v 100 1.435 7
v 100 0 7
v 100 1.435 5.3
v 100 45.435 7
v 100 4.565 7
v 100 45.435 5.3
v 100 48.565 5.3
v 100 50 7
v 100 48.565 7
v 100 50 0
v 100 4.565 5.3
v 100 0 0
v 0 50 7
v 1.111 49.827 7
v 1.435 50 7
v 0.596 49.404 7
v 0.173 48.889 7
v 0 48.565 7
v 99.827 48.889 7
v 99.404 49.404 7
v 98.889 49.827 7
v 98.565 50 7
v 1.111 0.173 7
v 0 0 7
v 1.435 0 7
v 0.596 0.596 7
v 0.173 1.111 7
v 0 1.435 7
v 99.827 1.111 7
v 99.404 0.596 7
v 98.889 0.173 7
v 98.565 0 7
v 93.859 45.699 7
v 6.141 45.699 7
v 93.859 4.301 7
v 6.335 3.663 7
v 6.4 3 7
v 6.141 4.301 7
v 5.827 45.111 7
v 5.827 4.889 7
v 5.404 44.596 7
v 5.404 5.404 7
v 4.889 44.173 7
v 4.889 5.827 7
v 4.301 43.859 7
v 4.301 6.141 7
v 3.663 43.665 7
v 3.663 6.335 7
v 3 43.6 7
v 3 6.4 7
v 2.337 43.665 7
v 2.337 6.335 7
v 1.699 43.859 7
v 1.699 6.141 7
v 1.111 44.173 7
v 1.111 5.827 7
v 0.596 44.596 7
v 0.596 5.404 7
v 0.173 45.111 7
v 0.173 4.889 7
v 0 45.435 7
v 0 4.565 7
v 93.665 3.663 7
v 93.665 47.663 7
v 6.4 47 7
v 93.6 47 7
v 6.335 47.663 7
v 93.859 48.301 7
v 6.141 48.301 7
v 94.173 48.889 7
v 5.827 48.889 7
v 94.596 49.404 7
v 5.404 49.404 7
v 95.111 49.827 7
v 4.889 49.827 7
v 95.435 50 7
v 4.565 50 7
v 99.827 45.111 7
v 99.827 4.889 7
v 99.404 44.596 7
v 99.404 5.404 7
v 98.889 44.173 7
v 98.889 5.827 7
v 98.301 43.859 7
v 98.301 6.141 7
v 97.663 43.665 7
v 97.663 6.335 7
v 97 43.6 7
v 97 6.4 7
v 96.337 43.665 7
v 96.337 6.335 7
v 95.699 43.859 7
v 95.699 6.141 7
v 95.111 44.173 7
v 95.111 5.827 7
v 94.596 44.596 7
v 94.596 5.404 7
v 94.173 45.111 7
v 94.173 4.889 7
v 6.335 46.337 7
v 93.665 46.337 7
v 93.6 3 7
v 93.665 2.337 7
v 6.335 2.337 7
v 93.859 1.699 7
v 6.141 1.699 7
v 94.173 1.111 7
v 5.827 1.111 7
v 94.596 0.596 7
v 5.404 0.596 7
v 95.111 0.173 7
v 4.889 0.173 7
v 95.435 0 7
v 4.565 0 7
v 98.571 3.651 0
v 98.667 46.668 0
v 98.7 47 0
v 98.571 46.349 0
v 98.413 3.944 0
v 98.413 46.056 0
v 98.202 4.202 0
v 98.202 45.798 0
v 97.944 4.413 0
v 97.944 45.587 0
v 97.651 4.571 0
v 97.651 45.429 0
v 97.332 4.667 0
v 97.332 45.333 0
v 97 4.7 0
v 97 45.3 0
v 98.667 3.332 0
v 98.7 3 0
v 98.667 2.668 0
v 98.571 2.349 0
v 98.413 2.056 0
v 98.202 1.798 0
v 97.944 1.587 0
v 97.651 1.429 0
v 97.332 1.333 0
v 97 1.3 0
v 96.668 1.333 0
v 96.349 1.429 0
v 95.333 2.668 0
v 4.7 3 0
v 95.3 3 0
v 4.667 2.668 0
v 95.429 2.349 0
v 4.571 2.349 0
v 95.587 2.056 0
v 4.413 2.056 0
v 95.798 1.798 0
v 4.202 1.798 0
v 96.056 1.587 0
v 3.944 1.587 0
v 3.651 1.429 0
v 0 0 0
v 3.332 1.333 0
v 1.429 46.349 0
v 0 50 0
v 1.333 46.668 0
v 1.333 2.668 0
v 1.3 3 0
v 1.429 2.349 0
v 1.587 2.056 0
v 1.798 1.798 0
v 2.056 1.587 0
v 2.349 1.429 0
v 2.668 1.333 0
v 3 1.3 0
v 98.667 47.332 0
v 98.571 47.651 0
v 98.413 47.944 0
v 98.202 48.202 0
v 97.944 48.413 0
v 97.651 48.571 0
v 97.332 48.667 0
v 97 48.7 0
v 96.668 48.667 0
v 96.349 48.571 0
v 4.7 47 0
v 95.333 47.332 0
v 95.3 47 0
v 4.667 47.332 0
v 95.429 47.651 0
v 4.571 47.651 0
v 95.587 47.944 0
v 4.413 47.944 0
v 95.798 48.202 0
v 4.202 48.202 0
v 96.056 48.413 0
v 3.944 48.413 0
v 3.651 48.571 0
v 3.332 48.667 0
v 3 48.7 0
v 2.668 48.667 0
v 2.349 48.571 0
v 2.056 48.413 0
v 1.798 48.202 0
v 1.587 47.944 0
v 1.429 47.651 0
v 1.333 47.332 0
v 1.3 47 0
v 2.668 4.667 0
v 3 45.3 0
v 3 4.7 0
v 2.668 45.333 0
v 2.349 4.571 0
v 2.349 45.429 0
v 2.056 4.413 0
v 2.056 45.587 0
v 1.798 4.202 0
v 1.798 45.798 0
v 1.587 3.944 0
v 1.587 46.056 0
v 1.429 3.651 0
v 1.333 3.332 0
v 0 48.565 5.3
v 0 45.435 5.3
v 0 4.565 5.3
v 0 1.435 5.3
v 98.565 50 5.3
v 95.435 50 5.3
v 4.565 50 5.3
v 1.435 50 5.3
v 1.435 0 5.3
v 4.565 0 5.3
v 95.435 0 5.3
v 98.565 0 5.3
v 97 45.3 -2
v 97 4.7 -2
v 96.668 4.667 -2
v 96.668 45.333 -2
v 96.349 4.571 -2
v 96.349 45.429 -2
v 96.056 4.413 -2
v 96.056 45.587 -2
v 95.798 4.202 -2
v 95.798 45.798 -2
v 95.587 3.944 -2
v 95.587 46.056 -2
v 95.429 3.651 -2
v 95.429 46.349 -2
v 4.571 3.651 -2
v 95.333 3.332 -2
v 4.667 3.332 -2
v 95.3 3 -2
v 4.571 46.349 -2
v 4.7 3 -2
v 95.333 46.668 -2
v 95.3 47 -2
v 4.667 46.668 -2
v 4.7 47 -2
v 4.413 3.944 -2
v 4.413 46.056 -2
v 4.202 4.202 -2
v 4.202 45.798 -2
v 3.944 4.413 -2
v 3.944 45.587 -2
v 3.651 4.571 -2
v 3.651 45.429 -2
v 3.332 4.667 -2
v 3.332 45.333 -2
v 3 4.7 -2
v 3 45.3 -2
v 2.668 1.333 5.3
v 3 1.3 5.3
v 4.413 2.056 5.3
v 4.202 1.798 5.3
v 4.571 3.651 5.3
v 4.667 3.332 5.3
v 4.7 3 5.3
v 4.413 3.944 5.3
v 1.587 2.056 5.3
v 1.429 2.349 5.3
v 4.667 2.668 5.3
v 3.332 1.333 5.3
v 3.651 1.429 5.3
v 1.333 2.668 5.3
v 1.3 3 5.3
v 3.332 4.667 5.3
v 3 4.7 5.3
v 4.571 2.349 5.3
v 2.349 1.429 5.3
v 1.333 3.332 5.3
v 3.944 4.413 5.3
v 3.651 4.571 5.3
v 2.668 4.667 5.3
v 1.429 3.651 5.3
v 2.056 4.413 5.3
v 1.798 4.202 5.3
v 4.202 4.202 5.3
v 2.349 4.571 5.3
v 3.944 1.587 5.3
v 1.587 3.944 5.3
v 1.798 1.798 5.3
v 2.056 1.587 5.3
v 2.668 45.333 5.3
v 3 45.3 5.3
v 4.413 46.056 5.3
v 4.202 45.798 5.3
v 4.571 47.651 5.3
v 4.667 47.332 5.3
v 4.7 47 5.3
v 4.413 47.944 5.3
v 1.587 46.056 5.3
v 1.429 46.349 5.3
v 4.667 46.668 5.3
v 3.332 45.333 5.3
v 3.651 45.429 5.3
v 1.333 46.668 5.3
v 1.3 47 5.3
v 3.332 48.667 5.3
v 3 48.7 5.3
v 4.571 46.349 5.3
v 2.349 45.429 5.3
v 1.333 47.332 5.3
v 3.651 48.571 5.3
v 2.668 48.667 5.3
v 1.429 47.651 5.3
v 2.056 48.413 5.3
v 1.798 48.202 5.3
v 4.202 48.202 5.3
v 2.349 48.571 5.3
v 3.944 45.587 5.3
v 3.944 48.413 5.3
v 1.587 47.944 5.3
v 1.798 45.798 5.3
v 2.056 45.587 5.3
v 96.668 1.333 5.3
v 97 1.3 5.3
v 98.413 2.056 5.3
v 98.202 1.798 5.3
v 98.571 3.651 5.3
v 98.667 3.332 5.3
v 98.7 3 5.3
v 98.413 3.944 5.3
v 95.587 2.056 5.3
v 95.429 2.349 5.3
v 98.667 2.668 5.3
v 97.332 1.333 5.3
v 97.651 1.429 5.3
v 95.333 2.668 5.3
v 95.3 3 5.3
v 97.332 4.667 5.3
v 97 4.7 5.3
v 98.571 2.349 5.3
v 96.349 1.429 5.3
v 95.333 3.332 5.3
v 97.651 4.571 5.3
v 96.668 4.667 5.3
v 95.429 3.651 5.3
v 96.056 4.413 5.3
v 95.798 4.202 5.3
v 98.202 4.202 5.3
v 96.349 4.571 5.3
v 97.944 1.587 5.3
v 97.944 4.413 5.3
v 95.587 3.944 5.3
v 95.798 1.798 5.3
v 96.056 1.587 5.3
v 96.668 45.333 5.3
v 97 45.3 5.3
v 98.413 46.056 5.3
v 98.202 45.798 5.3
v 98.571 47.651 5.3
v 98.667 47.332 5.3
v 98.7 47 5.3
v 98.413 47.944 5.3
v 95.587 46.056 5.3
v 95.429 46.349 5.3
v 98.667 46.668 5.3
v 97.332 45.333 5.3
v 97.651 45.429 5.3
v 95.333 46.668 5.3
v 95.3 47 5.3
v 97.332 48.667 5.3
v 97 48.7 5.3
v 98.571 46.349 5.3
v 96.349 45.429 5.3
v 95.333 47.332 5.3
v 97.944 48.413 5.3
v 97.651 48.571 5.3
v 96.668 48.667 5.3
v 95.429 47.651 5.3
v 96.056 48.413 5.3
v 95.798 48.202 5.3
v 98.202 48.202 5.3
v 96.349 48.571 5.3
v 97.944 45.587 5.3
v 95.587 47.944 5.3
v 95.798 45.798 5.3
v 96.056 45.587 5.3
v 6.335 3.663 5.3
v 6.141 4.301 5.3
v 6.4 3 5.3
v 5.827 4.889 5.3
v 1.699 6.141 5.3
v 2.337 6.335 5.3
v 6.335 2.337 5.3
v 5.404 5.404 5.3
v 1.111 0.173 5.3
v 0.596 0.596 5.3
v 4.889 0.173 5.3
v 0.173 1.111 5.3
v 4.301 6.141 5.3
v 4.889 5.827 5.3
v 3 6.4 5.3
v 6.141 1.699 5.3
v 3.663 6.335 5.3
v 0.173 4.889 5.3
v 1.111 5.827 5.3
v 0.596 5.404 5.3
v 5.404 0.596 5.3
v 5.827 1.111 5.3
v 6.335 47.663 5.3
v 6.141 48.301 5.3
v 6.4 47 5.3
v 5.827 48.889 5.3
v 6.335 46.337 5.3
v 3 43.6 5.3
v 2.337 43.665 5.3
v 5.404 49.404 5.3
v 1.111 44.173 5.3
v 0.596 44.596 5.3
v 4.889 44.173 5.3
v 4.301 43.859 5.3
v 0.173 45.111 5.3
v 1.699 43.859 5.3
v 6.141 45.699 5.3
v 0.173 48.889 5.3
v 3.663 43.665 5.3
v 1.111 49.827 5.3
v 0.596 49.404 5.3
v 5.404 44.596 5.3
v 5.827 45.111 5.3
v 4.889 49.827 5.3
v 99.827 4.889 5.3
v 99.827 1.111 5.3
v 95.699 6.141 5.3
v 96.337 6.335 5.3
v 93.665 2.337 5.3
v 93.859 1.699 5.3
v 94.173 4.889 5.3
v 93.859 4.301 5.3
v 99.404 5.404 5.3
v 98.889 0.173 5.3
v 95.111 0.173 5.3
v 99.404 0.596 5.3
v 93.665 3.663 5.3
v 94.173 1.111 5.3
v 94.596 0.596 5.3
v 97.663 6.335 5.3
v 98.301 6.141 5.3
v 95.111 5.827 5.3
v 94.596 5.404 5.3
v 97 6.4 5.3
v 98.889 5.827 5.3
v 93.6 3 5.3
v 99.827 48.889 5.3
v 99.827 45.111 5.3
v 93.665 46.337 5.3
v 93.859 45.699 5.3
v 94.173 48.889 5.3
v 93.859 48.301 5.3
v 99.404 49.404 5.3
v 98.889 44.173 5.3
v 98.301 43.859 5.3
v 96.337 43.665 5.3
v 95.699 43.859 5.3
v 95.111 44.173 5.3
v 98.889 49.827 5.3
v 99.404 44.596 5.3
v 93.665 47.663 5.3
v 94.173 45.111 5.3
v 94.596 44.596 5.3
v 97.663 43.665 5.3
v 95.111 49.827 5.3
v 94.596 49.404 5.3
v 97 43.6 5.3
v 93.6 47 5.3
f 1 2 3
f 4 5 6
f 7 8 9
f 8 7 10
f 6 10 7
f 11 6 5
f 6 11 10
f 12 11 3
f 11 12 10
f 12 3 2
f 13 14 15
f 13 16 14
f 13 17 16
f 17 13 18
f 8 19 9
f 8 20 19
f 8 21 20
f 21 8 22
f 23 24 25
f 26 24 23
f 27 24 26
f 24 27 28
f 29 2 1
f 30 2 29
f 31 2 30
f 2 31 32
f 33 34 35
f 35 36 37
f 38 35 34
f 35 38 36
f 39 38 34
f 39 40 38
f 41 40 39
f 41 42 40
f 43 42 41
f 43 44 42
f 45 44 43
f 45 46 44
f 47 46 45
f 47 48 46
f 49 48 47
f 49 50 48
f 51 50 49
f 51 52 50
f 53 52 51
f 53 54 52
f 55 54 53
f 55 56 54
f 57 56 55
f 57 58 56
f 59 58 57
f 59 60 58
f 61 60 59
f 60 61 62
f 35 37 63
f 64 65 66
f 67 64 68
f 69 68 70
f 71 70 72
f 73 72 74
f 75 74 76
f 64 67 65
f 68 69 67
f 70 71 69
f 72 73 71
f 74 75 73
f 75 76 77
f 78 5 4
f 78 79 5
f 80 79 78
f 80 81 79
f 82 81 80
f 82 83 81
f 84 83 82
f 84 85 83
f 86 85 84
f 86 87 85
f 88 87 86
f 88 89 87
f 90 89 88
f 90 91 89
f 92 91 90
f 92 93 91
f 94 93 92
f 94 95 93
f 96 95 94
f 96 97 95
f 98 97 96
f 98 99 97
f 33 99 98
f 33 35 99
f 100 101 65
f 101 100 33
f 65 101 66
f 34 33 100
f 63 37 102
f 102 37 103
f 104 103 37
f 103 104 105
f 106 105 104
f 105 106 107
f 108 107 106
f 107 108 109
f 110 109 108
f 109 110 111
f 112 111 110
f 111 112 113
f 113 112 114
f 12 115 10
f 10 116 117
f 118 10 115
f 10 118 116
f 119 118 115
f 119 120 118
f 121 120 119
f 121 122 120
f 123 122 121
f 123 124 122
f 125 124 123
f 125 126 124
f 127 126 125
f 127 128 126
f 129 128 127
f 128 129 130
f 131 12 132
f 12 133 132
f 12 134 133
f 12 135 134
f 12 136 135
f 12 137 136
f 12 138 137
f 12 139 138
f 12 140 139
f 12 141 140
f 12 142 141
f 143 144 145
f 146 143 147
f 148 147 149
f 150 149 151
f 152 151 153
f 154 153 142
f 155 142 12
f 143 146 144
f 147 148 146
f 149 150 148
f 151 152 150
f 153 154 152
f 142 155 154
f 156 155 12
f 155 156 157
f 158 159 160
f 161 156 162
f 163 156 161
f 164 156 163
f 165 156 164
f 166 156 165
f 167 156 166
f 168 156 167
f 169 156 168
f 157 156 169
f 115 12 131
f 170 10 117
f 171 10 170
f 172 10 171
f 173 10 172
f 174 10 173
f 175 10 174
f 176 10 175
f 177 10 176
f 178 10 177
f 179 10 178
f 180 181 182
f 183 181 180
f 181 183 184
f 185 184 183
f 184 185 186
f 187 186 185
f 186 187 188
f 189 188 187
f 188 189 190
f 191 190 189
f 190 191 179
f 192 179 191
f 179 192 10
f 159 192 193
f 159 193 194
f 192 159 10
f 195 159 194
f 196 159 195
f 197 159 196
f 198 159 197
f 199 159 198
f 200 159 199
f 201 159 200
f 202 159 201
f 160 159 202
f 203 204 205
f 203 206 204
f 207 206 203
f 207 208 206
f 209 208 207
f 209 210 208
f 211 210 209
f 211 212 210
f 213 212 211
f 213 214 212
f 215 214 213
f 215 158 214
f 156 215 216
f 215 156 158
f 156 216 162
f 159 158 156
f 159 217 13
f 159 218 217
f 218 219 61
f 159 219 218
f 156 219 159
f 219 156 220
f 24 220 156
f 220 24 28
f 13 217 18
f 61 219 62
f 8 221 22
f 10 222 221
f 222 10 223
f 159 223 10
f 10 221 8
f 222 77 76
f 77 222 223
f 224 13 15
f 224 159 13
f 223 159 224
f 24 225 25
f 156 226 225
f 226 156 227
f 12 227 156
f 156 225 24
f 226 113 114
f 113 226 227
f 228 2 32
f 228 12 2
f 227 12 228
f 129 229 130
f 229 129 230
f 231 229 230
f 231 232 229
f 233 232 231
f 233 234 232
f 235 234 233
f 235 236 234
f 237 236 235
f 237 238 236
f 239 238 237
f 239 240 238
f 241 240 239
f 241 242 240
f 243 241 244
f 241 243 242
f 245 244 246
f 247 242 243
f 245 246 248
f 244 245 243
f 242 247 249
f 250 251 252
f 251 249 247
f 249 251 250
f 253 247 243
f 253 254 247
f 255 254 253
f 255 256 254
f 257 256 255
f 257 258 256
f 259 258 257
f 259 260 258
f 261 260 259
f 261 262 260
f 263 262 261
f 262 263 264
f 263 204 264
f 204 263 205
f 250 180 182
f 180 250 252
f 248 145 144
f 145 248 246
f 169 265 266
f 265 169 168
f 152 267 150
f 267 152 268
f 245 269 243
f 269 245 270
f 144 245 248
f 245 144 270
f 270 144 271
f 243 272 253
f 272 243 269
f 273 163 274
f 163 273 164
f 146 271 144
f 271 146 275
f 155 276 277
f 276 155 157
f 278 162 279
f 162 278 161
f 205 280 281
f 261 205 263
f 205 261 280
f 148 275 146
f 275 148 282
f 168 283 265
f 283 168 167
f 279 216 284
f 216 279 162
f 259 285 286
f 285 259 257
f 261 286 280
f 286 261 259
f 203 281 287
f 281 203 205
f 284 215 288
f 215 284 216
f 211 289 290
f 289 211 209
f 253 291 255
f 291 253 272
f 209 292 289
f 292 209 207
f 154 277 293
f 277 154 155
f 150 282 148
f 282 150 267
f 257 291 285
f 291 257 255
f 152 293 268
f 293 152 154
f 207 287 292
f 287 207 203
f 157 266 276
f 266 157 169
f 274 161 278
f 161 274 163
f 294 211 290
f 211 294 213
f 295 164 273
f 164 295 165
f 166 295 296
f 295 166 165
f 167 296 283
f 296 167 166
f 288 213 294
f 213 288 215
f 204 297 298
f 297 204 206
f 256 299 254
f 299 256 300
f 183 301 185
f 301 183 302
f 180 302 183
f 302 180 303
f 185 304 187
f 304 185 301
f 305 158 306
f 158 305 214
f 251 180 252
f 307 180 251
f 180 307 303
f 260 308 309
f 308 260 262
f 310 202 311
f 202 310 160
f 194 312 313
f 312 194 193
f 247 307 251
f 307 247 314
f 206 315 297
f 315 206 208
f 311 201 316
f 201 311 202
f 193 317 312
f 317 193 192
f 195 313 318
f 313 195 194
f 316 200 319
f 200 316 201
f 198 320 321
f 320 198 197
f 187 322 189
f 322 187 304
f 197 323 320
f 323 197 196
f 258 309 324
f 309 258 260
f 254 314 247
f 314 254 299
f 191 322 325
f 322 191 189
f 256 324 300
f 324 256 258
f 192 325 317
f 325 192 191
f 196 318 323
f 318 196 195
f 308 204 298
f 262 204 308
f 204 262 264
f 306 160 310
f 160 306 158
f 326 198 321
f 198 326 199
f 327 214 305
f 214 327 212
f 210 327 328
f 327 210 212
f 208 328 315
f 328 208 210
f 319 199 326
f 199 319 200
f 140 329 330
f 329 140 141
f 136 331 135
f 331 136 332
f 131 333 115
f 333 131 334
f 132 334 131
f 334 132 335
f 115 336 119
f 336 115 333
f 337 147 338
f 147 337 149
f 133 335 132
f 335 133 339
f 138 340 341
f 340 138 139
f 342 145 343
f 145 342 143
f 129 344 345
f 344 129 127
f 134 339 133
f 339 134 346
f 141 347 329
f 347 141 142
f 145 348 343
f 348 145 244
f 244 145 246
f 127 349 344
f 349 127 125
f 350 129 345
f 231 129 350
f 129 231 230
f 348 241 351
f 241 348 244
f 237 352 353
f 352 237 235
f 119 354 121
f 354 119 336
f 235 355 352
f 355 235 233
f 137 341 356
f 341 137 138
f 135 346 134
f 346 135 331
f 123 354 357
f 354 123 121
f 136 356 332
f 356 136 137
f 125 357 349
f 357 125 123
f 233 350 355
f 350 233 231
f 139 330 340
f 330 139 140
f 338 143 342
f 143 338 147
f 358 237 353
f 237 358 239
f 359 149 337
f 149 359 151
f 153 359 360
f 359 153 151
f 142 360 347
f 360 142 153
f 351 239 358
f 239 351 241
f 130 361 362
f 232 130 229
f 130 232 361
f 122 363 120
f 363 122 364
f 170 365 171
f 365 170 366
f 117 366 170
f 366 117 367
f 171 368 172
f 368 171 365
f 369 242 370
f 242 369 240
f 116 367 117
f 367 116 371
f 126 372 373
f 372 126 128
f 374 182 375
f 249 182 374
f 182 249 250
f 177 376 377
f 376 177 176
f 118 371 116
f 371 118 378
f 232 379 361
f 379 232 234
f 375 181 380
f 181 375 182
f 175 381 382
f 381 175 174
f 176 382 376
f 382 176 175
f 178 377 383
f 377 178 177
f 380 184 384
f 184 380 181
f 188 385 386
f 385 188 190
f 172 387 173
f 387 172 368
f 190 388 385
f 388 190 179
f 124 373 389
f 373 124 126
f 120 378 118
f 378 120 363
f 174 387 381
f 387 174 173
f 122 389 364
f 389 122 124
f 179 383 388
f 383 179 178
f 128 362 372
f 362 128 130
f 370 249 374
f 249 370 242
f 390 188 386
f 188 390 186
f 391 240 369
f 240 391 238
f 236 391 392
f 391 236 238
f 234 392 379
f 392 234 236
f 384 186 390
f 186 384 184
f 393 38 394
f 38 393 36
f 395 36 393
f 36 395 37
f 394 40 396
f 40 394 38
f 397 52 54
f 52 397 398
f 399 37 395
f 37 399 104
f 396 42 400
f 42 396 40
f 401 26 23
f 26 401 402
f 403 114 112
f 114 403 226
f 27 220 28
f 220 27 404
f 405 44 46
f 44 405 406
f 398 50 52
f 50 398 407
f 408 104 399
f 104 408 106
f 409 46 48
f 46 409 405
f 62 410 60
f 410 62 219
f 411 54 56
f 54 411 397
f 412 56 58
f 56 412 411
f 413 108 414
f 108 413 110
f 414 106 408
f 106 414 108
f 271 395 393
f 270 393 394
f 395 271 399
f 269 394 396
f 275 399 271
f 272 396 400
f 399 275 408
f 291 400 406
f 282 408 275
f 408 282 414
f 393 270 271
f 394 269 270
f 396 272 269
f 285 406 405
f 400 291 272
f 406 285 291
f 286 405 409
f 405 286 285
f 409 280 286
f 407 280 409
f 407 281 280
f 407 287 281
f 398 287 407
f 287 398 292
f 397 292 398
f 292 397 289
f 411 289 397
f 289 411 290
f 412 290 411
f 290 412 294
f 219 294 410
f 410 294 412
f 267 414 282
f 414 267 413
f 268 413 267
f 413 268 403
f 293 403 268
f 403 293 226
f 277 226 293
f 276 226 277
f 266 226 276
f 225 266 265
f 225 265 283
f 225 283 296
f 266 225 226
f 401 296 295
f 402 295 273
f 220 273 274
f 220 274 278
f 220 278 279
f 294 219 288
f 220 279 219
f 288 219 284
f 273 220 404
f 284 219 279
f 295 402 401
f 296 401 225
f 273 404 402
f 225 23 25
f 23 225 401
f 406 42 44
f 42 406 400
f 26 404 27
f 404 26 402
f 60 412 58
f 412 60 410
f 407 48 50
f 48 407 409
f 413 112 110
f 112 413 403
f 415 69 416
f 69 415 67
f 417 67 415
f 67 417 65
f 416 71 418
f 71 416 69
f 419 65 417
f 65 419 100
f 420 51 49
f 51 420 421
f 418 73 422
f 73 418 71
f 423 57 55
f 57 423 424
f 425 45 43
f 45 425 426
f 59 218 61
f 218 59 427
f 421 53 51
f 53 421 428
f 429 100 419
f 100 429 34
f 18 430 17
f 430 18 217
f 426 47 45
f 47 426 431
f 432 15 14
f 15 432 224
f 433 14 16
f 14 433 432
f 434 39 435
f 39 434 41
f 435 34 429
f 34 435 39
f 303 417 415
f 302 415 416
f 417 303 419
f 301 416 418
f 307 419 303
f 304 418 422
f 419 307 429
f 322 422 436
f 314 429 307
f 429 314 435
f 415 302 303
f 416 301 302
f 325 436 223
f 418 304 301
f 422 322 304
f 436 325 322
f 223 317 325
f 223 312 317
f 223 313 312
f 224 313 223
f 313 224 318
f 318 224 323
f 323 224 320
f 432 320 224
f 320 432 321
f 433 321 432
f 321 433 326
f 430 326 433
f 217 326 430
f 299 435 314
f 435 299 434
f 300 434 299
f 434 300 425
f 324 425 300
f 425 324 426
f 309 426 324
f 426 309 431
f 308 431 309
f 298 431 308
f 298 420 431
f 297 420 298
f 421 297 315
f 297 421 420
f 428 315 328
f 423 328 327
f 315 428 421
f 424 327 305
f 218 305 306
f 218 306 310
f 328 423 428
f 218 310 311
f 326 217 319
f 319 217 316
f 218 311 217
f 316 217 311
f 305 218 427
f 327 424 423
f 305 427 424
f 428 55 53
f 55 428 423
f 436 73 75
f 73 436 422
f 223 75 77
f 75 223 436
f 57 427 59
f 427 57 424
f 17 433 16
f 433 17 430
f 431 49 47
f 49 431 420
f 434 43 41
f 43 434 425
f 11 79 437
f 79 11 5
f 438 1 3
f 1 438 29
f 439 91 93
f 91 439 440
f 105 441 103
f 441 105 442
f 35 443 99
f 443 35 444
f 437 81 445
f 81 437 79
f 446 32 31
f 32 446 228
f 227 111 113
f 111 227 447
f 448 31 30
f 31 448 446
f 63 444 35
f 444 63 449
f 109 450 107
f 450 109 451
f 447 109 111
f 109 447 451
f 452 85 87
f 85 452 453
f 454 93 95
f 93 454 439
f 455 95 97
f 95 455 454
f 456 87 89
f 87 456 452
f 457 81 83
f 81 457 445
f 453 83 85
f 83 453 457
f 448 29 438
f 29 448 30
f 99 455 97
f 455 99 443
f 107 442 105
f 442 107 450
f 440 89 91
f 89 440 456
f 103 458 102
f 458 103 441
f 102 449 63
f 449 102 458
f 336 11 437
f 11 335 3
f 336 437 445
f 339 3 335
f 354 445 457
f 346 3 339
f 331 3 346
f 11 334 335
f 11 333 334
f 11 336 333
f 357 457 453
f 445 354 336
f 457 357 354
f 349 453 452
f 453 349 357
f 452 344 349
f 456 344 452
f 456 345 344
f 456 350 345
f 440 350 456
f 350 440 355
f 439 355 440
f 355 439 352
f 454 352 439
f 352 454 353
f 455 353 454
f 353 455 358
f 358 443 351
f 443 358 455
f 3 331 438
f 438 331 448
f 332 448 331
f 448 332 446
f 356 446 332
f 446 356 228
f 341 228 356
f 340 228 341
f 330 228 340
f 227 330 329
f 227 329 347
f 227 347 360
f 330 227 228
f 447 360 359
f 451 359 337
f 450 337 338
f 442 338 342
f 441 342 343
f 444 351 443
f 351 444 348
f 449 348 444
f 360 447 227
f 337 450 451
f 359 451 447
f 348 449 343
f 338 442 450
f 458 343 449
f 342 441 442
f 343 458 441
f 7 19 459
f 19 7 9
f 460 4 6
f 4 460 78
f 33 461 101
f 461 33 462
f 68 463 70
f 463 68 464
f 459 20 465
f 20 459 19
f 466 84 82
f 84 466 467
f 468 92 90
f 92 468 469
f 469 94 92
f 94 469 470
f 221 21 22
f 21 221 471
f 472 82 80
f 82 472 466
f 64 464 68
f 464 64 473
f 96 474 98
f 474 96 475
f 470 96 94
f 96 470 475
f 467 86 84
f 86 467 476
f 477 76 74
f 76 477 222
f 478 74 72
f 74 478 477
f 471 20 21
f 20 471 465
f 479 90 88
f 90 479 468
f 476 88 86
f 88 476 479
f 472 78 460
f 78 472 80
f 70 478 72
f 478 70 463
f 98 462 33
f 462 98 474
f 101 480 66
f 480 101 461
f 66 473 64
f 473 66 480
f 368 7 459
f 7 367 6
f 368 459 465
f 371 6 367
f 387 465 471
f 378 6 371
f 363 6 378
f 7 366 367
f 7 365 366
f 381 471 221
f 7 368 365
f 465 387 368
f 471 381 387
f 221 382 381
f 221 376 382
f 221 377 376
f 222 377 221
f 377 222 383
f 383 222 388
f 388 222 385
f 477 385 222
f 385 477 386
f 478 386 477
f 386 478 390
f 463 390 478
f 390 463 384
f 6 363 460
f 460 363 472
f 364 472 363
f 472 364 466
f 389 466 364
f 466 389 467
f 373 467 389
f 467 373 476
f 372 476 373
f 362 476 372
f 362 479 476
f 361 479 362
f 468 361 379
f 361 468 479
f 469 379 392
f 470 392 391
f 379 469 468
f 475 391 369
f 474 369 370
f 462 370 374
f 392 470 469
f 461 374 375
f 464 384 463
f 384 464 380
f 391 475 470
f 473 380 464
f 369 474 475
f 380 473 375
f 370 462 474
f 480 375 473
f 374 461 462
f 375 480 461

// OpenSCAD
$fn = 32;

// ----------------------------------------------------------------------
// Enclosure lid: 100 x 50 x 7 mm, 4 bolt holes
// ----------------------------------------------------------------------

// --- parameters (mm) ---
length = 100;             // lid length, X
width = 50;               // lid width, Y
plate_t = 7;              // lid plate thickness
bolt_d = 3.4;             // bolt clearance
boss_lip = 3;             // bolt hole inset from the corner
sink = 1;                 // overlap of the lip and ribs into the plate
lip_h = 3;                // lip height below the plate
lip_wall = 3;             // lip wall thickness
cs_d = 6.8;               // countersink diameter
cs_h = 1.7;               // countersink depth

module plate() {
  cube([length, width, plate_t]);
  /* lip that drops into the housing opening, sunk into the plate */
  translate([lip_wall, lip_wall, -lip_h + sink]) cube([length - 2 * lip_wall, width - 2 * lip_wall, lip_h]);
}

difference() {
  plate();
  /* bolt pattern matching the corner bosses */
  for (sx = [0, 1]) for (sy = [0, 1])
    translate([sx * (length - 2 * boss_lip) + boss_lip, sy * (width - 2 * boss_lip) + boss_lip, -lip_h - 1])
      cylinder(h = plate_t + lip_h + 2, d = bolt_d);
  /* countersinks so the heads sit flush */
  for (sx = [0, 1]) for (sy = [0, 1])
    translate([sx * (length - 2 * boss_lip) + boss_lip, sy * (width - 2 * boss_lip) + boss_lip, plate_t - cs_h])
      cylinder(h = cs_h + 0.5, d = cs_d);
}
